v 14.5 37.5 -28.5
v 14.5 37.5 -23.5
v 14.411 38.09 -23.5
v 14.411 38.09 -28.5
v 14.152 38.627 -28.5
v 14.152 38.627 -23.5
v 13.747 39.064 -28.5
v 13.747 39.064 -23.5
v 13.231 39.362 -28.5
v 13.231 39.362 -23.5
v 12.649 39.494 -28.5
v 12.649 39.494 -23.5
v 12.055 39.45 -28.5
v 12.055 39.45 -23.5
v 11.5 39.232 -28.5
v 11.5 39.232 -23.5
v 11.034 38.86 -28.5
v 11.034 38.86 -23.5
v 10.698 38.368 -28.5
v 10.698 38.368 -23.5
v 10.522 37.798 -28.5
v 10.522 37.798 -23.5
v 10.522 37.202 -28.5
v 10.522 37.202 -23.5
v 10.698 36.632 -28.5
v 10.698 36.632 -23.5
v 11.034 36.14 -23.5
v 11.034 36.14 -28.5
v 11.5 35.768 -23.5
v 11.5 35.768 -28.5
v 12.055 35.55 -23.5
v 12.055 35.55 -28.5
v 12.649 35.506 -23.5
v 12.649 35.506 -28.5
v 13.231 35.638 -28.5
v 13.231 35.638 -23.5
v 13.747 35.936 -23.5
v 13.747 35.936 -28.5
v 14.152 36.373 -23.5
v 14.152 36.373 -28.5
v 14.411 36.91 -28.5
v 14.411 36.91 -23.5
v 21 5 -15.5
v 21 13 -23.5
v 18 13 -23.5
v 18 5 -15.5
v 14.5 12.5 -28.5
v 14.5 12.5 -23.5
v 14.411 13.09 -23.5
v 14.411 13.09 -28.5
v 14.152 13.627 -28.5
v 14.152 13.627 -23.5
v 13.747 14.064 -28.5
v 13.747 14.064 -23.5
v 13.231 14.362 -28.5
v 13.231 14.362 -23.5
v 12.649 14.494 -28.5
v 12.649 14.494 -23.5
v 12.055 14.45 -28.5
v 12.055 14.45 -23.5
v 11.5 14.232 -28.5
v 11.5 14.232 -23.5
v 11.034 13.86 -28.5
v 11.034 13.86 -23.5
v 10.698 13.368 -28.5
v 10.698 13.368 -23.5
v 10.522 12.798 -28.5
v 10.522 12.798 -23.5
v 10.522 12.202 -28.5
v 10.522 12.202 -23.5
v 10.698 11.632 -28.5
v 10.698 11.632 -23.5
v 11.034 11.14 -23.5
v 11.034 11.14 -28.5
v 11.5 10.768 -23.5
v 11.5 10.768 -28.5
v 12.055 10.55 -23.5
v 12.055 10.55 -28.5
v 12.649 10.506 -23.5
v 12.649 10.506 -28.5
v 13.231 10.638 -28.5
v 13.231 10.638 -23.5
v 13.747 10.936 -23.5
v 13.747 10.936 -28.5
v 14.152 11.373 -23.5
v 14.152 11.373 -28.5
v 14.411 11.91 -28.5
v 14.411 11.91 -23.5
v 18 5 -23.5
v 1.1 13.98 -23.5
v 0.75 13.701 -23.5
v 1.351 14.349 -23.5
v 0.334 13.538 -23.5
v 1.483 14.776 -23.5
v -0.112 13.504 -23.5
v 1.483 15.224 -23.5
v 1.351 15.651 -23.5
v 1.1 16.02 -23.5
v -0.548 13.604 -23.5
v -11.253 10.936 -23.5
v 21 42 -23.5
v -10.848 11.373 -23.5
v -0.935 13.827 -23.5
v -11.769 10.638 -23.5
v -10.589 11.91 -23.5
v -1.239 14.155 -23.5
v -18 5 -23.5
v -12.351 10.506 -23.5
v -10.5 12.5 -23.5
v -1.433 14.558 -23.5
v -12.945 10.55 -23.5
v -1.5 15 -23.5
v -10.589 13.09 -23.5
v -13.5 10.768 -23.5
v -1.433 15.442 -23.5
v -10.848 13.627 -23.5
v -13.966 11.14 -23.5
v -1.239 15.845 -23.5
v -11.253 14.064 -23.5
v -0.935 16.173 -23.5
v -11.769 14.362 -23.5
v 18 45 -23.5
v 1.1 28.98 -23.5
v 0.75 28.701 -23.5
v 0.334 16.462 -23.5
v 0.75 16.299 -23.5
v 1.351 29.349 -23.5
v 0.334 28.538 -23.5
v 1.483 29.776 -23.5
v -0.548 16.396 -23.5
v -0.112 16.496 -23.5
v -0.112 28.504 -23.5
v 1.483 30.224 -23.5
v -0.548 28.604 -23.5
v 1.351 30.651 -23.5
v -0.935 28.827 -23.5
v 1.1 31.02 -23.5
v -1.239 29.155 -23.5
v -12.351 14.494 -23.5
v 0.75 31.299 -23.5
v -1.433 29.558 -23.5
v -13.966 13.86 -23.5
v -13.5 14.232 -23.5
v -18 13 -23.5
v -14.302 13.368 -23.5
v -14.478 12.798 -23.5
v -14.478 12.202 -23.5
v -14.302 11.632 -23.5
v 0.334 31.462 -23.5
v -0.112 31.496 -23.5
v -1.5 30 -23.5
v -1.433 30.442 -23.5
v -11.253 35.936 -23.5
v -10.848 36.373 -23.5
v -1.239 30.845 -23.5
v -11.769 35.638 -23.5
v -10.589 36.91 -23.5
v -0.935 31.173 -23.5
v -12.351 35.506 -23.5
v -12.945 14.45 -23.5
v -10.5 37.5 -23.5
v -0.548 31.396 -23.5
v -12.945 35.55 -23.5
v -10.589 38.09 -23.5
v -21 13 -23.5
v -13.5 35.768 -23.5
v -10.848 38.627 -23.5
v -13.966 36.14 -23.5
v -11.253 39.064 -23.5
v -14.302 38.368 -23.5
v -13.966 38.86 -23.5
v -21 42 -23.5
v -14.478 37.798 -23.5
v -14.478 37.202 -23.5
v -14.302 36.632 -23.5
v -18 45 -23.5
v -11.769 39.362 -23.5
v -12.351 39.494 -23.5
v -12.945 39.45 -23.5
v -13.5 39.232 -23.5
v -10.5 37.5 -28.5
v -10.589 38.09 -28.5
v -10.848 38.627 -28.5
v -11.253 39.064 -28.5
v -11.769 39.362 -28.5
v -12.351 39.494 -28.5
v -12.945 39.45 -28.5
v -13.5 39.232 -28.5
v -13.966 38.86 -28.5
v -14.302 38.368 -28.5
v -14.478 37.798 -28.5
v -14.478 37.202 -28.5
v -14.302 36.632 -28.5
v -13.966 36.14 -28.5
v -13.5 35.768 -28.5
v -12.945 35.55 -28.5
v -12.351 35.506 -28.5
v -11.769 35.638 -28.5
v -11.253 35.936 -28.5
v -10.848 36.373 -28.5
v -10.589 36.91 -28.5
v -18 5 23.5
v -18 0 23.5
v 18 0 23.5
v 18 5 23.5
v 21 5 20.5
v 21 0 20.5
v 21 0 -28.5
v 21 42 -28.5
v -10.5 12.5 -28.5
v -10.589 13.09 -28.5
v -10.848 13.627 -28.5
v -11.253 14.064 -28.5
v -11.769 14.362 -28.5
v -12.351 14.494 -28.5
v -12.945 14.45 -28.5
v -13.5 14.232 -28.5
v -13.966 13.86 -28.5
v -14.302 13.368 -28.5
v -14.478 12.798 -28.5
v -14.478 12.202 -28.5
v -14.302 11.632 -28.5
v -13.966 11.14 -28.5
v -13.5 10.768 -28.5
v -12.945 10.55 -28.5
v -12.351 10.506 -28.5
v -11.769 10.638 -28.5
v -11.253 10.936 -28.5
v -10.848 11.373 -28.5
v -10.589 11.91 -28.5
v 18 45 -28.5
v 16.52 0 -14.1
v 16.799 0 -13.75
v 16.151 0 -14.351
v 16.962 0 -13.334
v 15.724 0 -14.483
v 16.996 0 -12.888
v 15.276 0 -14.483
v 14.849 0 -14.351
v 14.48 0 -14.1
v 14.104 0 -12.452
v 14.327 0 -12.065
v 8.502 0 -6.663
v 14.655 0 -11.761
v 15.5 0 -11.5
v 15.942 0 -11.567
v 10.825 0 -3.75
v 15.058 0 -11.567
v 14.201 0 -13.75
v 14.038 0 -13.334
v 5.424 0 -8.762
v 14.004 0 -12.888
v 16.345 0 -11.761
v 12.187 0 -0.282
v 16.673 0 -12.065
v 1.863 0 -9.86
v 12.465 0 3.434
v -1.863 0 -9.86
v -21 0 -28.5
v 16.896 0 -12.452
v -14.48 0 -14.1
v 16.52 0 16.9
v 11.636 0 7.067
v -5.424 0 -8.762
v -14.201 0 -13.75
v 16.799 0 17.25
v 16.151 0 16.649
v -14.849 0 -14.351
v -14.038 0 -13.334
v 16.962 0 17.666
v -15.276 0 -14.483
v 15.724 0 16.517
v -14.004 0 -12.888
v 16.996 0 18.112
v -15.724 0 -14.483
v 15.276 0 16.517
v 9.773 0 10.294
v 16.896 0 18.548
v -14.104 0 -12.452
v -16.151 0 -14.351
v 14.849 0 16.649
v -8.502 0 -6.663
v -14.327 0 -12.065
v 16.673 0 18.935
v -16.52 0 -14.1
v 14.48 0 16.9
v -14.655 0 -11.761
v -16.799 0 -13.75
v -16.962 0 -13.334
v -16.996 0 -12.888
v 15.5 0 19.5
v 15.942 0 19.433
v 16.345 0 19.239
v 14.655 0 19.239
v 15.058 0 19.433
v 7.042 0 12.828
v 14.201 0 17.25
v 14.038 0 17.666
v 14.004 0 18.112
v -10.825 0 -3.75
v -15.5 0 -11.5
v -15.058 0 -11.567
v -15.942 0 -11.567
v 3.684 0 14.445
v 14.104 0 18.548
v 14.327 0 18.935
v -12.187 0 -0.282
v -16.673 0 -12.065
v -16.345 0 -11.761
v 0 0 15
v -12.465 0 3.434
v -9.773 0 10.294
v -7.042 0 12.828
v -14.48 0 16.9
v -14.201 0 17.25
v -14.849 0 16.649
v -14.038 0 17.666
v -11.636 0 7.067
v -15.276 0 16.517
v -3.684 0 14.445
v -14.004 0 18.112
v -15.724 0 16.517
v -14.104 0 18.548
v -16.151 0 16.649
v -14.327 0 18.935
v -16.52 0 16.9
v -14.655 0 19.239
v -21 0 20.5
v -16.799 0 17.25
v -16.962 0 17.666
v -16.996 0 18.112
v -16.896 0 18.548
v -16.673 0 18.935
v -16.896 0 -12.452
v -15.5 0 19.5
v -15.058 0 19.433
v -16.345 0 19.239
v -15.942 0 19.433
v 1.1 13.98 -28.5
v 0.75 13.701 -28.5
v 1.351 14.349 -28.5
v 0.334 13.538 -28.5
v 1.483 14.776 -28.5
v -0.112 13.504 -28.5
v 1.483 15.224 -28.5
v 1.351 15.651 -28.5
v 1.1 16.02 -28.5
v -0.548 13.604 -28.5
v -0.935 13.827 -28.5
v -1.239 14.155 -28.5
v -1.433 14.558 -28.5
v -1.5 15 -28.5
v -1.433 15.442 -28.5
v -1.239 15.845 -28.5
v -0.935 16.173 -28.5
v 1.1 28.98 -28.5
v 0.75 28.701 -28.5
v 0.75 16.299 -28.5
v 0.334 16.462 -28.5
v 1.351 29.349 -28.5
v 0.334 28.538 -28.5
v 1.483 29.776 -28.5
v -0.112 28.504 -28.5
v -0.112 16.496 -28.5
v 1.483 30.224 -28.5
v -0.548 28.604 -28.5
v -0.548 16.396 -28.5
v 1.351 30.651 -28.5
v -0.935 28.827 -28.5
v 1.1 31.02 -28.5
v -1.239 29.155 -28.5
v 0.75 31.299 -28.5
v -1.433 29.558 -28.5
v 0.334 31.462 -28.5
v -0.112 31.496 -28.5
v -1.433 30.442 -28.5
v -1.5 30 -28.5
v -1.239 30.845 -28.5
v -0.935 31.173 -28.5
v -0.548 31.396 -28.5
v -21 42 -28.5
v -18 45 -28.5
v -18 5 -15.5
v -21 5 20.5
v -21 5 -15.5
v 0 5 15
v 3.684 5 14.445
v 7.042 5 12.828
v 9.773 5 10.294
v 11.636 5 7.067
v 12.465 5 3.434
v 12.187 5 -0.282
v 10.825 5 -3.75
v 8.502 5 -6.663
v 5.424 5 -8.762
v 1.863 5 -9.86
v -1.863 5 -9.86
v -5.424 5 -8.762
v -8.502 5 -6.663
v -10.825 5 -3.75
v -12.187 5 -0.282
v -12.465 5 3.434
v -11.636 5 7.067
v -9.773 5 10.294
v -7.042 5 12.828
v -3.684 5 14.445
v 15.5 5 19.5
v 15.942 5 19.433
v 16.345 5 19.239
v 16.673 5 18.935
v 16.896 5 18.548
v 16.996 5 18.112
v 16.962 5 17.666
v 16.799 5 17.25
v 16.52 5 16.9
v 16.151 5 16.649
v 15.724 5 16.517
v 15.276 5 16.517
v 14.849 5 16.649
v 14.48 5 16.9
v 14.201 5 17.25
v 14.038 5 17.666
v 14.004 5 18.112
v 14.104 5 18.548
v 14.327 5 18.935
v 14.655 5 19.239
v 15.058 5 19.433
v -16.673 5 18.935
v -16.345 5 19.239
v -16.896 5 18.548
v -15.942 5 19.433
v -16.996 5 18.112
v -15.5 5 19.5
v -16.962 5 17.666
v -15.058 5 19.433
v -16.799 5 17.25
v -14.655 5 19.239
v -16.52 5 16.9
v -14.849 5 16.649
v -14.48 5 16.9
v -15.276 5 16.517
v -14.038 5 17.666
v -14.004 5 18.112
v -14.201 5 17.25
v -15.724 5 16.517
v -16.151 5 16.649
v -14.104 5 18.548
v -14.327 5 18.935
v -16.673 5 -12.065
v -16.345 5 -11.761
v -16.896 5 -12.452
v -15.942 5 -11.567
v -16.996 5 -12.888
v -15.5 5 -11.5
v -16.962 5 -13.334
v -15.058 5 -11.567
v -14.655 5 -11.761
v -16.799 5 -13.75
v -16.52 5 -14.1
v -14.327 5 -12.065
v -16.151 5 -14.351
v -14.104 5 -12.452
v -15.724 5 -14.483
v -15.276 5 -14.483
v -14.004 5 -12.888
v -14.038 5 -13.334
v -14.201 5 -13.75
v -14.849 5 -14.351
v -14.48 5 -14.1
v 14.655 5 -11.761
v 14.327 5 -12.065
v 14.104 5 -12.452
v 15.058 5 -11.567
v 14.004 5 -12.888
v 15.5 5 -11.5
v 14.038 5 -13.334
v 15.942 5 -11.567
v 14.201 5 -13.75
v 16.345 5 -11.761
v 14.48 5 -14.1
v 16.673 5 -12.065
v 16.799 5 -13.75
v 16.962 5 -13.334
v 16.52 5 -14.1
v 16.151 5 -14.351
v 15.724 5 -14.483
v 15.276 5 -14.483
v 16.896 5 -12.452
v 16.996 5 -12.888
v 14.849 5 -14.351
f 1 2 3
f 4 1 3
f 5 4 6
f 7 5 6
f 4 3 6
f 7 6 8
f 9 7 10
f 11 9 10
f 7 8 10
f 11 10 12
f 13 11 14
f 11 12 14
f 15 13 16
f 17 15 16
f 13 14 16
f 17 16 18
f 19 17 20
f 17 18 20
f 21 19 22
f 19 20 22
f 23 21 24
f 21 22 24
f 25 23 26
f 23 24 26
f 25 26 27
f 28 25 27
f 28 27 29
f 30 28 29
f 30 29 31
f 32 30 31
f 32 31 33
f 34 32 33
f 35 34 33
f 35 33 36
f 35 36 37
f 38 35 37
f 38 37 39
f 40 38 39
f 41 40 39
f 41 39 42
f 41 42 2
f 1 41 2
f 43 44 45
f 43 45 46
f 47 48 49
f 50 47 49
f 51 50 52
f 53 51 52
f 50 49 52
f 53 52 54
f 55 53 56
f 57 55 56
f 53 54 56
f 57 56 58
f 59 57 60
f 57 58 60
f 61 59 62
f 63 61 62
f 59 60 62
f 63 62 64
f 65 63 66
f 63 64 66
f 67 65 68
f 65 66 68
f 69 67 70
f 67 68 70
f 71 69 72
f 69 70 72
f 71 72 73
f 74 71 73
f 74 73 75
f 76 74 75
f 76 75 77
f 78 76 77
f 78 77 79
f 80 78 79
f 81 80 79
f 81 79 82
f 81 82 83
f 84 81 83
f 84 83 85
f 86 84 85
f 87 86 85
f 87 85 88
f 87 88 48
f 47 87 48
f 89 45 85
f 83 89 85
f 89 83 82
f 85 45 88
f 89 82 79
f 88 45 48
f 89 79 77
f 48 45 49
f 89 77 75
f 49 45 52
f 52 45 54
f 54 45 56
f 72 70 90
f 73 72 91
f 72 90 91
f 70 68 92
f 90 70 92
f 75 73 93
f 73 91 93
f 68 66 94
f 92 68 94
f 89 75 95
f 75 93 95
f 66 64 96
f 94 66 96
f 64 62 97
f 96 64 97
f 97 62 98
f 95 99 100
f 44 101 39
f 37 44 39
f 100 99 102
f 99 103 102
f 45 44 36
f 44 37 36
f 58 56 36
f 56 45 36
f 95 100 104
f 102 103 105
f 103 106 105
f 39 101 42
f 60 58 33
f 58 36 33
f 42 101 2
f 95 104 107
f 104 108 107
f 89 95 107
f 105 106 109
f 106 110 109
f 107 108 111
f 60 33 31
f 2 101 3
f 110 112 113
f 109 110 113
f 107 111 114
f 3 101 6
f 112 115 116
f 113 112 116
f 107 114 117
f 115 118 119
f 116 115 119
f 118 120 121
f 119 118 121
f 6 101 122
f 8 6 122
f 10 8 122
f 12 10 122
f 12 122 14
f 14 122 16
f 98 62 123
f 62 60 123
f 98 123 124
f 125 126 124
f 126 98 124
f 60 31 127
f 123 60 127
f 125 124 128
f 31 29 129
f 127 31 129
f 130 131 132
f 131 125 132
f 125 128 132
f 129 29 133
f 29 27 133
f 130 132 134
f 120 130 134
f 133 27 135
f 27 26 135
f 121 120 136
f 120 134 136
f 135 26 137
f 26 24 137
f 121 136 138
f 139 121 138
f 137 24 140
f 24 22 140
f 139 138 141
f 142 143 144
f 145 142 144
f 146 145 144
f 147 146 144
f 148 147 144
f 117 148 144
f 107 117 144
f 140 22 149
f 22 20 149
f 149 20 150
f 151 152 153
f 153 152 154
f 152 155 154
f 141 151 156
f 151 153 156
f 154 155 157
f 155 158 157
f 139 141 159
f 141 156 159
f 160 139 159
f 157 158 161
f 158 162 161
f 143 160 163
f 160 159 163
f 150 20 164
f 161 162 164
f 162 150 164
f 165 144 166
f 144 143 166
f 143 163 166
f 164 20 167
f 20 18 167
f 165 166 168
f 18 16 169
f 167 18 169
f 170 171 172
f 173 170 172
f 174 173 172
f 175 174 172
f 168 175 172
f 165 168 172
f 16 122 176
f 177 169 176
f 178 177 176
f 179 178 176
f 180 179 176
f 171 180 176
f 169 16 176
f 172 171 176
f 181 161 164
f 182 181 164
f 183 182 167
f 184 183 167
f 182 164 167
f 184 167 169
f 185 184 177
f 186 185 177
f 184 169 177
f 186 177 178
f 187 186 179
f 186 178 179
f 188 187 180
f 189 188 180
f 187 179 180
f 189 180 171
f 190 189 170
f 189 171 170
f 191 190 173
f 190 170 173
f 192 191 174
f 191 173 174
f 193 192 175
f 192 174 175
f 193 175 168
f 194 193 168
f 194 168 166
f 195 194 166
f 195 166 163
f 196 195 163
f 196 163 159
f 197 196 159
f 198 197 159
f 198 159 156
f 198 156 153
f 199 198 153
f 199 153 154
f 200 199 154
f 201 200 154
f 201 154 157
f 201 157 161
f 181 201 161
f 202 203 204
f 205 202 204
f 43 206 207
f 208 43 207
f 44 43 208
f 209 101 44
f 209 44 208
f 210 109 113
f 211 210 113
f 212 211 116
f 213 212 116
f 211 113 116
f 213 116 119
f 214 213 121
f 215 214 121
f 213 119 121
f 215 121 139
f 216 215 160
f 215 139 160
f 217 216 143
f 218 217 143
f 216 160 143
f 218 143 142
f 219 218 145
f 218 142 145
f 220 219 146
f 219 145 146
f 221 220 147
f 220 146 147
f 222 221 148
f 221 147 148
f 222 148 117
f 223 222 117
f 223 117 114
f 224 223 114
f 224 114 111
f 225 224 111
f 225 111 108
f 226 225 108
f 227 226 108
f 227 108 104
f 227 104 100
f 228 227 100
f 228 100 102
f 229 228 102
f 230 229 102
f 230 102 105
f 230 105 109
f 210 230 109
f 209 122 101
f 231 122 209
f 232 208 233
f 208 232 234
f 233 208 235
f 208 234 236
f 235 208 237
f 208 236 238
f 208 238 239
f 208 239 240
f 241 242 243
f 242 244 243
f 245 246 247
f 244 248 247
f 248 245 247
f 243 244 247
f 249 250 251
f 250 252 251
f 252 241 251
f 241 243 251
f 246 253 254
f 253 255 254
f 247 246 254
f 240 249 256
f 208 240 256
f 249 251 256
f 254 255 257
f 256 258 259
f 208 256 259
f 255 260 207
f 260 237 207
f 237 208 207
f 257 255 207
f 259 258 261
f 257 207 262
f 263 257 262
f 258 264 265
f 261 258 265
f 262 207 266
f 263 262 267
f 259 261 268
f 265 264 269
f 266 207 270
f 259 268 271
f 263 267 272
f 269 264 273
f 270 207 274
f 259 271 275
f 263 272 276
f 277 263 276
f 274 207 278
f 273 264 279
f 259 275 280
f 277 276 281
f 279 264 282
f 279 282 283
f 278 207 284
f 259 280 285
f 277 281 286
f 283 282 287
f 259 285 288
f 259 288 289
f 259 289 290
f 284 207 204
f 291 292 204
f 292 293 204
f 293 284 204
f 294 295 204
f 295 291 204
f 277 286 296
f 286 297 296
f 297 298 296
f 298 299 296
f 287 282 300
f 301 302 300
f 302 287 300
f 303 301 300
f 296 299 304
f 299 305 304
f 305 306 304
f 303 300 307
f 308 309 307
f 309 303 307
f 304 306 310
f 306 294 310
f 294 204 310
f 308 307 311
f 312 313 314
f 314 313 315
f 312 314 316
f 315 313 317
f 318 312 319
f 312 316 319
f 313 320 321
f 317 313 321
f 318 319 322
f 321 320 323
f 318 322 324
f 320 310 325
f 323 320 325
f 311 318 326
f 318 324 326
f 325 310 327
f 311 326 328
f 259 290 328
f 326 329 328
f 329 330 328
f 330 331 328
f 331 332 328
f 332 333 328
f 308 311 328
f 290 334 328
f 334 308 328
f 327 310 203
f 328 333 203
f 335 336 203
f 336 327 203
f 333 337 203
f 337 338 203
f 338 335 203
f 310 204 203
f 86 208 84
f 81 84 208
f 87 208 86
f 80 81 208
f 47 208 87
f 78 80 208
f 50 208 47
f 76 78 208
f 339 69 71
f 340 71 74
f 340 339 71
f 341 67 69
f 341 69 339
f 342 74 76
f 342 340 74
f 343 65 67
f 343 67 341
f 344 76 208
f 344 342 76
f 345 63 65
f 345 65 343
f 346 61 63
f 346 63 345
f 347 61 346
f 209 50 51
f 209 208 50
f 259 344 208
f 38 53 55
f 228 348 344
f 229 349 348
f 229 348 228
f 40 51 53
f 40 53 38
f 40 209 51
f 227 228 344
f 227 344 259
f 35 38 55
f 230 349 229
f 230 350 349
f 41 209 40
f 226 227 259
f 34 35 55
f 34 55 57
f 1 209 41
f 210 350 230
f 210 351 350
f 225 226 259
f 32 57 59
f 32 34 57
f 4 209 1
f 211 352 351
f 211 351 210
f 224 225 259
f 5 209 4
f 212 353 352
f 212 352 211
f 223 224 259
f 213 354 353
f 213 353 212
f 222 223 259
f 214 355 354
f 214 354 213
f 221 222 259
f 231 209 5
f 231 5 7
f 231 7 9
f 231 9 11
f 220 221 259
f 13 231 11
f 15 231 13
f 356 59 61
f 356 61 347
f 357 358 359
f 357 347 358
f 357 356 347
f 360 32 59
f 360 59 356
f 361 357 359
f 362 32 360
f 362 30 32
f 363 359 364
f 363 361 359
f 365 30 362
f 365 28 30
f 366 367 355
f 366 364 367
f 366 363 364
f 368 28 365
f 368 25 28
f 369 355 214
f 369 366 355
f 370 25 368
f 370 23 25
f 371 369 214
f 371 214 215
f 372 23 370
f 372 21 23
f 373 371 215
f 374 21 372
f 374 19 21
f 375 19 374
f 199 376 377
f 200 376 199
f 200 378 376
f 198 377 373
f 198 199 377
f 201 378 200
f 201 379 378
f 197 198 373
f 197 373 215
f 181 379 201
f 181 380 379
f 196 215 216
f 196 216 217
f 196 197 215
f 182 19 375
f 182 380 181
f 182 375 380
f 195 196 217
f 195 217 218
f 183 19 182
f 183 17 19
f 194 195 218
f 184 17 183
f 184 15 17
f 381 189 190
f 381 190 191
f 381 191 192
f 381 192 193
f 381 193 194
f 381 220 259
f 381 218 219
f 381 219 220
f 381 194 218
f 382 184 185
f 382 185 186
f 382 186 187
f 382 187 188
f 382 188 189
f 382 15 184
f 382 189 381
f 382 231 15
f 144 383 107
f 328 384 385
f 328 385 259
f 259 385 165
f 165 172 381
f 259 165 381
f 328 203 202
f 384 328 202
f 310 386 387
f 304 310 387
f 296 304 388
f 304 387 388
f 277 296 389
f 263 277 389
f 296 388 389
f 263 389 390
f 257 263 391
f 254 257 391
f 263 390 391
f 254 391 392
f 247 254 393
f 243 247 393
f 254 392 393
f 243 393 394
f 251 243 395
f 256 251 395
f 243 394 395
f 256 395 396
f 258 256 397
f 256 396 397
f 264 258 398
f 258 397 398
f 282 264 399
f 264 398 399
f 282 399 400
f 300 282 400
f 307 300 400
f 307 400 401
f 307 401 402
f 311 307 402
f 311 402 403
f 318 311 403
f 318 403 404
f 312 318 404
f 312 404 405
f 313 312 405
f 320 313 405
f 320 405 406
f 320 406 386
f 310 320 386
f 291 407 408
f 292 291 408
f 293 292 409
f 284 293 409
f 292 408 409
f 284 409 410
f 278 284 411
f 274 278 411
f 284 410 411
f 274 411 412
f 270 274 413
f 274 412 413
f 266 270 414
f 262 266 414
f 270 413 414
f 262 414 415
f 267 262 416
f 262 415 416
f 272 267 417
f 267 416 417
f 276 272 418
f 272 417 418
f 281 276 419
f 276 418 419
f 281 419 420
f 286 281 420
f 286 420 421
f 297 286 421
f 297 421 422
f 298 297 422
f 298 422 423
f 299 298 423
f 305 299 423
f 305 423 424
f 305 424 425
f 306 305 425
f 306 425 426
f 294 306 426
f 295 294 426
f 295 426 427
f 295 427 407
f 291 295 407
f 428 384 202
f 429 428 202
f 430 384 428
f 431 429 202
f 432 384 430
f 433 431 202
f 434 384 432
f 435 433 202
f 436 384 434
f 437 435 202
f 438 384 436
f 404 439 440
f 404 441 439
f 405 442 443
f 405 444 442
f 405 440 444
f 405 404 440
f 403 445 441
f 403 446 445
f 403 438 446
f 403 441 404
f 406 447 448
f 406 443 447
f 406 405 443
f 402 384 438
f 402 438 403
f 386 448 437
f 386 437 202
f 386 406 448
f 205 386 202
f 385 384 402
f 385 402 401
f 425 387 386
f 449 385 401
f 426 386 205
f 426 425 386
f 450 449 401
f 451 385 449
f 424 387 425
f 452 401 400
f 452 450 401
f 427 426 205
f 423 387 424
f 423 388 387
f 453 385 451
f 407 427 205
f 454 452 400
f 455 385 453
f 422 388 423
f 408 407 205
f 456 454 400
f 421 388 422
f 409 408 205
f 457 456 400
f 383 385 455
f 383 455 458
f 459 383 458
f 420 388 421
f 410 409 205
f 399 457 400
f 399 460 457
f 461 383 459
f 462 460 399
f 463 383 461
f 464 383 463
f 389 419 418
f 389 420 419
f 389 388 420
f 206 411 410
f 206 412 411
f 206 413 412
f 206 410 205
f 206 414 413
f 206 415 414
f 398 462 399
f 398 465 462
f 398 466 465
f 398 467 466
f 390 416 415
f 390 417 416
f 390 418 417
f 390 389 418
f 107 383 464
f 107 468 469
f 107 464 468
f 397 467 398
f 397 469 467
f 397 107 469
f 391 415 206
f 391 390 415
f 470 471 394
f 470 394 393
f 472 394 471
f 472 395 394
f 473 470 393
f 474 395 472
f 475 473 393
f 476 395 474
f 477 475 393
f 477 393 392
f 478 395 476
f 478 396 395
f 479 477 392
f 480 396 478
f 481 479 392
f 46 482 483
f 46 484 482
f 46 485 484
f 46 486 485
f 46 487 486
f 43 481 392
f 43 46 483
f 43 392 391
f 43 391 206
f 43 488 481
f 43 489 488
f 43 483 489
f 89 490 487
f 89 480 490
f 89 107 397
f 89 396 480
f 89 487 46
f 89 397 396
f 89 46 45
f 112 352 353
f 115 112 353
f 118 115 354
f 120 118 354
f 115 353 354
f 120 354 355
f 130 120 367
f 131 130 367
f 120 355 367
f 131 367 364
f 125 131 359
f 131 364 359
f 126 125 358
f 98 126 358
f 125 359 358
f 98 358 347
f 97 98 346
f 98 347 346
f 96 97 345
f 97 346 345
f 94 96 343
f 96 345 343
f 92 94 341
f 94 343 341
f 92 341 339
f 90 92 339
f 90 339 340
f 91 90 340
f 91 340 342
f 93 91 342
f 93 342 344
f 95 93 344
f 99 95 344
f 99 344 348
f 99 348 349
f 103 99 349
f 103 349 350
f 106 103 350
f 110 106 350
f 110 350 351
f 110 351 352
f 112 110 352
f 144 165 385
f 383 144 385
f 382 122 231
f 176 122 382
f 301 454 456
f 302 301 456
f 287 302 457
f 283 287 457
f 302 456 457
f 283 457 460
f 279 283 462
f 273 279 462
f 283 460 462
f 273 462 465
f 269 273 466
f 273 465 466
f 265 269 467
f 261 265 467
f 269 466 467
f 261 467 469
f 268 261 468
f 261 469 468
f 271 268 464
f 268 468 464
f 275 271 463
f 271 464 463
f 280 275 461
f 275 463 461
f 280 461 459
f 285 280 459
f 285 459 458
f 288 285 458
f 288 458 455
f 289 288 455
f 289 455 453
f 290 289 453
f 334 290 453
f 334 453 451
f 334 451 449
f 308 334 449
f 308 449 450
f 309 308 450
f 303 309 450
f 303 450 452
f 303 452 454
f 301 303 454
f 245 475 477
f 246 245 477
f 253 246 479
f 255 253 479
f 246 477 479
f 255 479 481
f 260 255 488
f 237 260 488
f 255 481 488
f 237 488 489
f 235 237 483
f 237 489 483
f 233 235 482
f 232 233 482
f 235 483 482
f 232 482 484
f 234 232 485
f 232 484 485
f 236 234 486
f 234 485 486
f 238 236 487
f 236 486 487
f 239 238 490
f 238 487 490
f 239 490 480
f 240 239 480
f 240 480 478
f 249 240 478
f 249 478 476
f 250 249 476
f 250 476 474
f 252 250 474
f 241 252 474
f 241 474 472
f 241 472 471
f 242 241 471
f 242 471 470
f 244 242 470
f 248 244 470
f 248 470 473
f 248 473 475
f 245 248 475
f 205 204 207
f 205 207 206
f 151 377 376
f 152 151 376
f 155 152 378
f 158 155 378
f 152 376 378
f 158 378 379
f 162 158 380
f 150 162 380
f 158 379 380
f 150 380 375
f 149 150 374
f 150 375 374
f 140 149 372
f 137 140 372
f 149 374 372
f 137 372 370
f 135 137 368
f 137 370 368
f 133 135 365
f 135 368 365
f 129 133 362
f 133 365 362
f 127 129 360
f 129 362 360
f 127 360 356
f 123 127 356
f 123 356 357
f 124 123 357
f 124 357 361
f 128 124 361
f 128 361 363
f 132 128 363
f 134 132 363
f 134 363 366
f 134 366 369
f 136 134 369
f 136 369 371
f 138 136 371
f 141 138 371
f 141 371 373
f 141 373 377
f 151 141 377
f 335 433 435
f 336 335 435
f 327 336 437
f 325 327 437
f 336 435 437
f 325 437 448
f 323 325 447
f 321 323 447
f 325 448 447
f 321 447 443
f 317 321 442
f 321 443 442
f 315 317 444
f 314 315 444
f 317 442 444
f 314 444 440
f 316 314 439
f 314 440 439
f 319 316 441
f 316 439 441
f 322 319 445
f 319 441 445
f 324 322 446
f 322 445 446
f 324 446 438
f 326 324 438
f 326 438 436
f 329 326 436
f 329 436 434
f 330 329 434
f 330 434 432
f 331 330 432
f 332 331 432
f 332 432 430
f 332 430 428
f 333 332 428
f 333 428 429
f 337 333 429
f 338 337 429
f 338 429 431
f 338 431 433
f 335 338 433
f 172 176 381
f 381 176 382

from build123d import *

# Parameters (mm, degrees)
SKETCH1_W           = 42
SKETCH1_H           = 47
BOSS_EXTRUDE1_DEPTH = 5
SKETCH2_R           = 1.5
SKETCH2_R_2         = 12.5
CUT_EXTRUDE1_DEPTH  = 32.910029771
SKETCH4_W           = 42
SKETCH4_H           = 45
BOSS_EXTRUDE2_DEPTH = 5
BOSS_EXTRUDE3_DEPTH = 3
BOSS_EXTRUDE4_DEPTH = 3
SKETCH9_R           = 2
CUT_EXTRUDE4_DEPTH  = 69.373971656
CHAMFER3_SIZE       = 3
CUT_EXTRUDE5_REACH  = 73.903
SKETCH10_R          = 1.5


with BuildPart() as part:
    # Sketch1 → Boss-Extrude1 (new body)
    with BuildSketch(Plane(origin=(0, 0, 0), x_dir=(1, 0, 0), z_dir=(0, 1, 0))):
        Rectangle(SKETCH1_W, SKETCH1_H)
    extrude(amount=BOSS_EXTRUDE1_DEPTH)

    # Sketch2 → Cut-Extrude1 (cut, through all)
    with BuildSketch(Plane(origin=(0, 5, 0), x_dir=(1, 0, 0), z_dir=(0, 1, 0))):
        with Locations(Location((-15.5, 13, 0), (0, 0, 270))):
            Circle(SKETCH2_R)
        with Locations(Location((15.5, 13, 0), (0, 0, 270))):
            Circle(SKETCH2_R)
        with Locations(Location((15.5, -18, 0), (0, 0, 270))):
            Circle(SKETCH2_R)
        with Locations(Location((-15.5, -18, 0), (0, 0, 270))):
            Circle(SKETCH2_R)
        with Locations(Location((0, -2.5, 0), (0, 0, 270))):
            Circle(SKETCH2_R_2)
    extrude(amount=-CUT_EXTRUDE1_DEPTH, mode=Mode.SUBTRACT)

    # Sketch4 → Boss-Extrude2 (add)
    with BuildSketch(Plane(origin=(0, 0, -23.5), x_dir=(-1, 0, 0), z_dir=(0, 0, -1))):
        with Locations((0, 22.5)):
            Rectangle(SKETCH4_W, SKETCH4_H)
    extrude(amount=BOSS_EXTRUDE2_DEPTH)

    # Sketch5 → Boss-Extrude3 (add)
    with BuildSketch(Plane(origin=(21, 0, 0), x_dir=(0, 0, -1), z_dir=(1, 0, 0))):
        Polygon((23.5, 13), (15.5, 5), (23.5, 5), align=None)
    extrude(amount=-BOSS_EXTRUDE3_DEPTH)

    # Sketch6 → Boss-Extrude4 (add)
    with BuildSketch(Plane.ZY.offset(21)):
        Polygon((-23.5, 13), (-15.5, 5), (-23.5, 5), align=None)
    extrude(amount=-BOSS_EXTRUDE4_DEPTH)

    # Sketch9 → Cut-Extrude4 (cut, through all)
    with BuildSketch(Plane.XY.offset(-23.5)):
        with Locations((-12.5, 37.5)):
            Circle(SKETCH9_R)
        with Locations((12.5, 37.5)):
            Circle(SKETCH9_R)
        with Locations((12.5, 12.5)):
            Circle(SKETCH9_R)
        with Locations((-12.5, 12.5)):
            Circle(SKETCH9_R)
    extrude(amount=-CUT_EXTRUDE4_DEPTH, mode=Mode.SUBTRACT)

    # Chamfer3
    chamfer3_edges = [part.edges().sort_by_distance(p)[0] for p in [
        (-21, 2.5, 23.5),
        (21, 2.5, 23.5),
        (21, 45, -26),
        (-21, 45, -26),
    ]]
    chamfer(chamfer3_edges, length=CHAMFER3_SIZE)

    # Sketch10 → Cut-Extrude5 (cut, up to next)
    with BuildSketch(Plane(origin=(0, 0, -28.5), x_dir=(-1, 0, 0), z_dir=(0, 0, -1)), mode=Mode.PRIVATE) as cut_extrude5_sk1:
        with Locations((0, 30)):
            Circle(SKETCH10_R)
    cut_extrude5_tool1 = extrude(cut_extrude5_sk1.sketch, amount=-CUT_EXTRUDE5_REACH, mode=Mode.PRIVATE) & part.part
    # Sketch10 → Cut-Extrude5 (cut, up to next)
    with BuildSketch(Plane(origin=(0, 0, -28.5), x_dir=(-1, 0, 0), z_dir=(0, 0, -1)), mode=Mode.PRIVATE) as cut_extrude5_sk2:
        with Locations((0, 15)):
            Circle(SKETCH10_R)
    cut_extrude5_tool2 = extrude(cut_extrude5_sk2.sketch, amount=-CUT_EXTRUDE5_REACH, mode=Mode.PRIVATE) & part.part
    add(cut_extrude5_tool1.solids().sort_by_distance((0, 30, -28.5))[0], mode=Mode.SUBTRACT)
    add(cut_extrude5_tool2.solids().sort_by_distance((0, 15, -28.5))[0], mode=Mode.SUBTRACT)


solid = part.part
